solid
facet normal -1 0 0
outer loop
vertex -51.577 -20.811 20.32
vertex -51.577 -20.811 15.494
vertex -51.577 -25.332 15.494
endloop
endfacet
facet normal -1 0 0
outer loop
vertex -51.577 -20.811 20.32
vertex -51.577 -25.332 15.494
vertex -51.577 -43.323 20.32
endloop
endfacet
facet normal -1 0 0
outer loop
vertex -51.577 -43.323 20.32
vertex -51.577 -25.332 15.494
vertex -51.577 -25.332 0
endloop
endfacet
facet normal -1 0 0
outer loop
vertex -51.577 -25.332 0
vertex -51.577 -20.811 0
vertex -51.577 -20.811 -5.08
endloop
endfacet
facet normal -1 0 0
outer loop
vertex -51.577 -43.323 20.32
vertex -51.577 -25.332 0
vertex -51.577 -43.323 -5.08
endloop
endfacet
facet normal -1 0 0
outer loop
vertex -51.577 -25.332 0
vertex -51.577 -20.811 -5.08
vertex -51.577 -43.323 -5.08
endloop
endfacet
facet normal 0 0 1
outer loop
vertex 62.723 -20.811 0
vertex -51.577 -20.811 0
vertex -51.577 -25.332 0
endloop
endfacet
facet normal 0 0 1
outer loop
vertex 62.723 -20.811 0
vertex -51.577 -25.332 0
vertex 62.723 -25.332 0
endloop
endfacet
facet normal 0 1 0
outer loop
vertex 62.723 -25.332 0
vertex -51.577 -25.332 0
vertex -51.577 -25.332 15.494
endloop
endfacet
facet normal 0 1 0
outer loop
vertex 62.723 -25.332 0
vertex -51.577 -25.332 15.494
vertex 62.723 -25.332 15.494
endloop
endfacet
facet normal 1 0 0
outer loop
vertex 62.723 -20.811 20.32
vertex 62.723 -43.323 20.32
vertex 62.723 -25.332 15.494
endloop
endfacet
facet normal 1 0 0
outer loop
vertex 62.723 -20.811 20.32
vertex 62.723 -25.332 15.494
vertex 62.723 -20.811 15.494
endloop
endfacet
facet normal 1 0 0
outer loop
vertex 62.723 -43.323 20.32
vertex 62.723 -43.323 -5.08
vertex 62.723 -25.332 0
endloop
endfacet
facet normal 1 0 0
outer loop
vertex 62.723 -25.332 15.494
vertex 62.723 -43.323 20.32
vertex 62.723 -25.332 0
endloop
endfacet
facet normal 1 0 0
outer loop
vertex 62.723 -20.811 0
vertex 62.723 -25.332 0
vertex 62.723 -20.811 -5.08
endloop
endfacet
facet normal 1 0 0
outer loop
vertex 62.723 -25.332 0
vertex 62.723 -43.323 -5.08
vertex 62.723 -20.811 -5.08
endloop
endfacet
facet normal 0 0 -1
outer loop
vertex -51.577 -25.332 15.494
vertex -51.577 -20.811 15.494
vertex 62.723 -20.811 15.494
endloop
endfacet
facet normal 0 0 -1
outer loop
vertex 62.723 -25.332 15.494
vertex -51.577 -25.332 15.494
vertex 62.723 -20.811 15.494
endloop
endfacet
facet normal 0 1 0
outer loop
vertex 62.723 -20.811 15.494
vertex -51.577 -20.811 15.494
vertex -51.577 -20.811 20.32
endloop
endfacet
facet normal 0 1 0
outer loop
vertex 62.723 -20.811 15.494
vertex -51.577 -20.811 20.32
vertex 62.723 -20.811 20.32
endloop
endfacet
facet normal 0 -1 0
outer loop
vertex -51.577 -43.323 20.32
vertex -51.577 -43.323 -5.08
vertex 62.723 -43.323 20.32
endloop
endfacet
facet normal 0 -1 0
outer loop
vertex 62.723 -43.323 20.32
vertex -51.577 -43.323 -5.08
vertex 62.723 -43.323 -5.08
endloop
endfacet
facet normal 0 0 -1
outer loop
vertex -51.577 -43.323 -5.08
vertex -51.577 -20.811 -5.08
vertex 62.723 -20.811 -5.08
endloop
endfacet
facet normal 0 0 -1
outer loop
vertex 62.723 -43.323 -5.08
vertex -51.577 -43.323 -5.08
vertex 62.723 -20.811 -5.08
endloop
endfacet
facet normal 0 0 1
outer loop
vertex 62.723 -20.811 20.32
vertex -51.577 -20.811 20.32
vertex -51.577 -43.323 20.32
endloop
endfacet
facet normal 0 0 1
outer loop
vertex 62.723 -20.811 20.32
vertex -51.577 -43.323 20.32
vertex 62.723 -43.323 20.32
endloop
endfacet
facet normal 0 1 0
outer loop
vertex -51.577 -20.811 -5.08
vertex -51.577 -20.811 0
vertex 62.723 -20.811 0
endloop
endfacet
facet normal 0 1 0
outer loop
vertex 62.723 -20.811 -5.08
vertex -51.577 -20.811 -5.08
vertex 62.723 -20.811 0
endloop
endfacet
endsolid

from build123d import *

# Parameters (mm, degrees)
F0_W     = 114.3
F0_H     = 4.5211492
F0_H_2   = 17.9908454
F1_DEPTH = 5.08
F2_DEPTH = 15.494
F3_START = 15.494
F3_DEPTH = 4.826


with BuildPart() as f1:
    # F0 (on Top) → F1 (new body)
    with BuildSketch(Plane.XY):
        with Locations((5.5734652638, -23.0715045245)):
            Rectangle(F0_W, F0_H)
        with Locations((5.5734652638, -34.3275018245)):
            Rectangle(F0_W, F0_H_2)
    extrude(amount=-F1_DEPTH)

    # F0 (on Top) → F2 (join)
    with BuildSketch(Plane.XY):
        with Locations((5.5734652638, -34.3275018245)):
            Rectangle(F0_W, F0_H_2)
    extrude(amount=F2_DEPTH)

    # F0 (on Top) → F3 (join)
    with BuildSketch(Plane.XY.offset(F3_START)):
        with Locations((5.5734652638, -23.0715045245)):
            Rectangle(F0_W, F0_H)
        with Locations((5.5734652638, -34.3275018245)):
            Rectangle(F0_W, F0_H_2)
    extrude(amount=F3_DEPTH)


solid = f1.part
